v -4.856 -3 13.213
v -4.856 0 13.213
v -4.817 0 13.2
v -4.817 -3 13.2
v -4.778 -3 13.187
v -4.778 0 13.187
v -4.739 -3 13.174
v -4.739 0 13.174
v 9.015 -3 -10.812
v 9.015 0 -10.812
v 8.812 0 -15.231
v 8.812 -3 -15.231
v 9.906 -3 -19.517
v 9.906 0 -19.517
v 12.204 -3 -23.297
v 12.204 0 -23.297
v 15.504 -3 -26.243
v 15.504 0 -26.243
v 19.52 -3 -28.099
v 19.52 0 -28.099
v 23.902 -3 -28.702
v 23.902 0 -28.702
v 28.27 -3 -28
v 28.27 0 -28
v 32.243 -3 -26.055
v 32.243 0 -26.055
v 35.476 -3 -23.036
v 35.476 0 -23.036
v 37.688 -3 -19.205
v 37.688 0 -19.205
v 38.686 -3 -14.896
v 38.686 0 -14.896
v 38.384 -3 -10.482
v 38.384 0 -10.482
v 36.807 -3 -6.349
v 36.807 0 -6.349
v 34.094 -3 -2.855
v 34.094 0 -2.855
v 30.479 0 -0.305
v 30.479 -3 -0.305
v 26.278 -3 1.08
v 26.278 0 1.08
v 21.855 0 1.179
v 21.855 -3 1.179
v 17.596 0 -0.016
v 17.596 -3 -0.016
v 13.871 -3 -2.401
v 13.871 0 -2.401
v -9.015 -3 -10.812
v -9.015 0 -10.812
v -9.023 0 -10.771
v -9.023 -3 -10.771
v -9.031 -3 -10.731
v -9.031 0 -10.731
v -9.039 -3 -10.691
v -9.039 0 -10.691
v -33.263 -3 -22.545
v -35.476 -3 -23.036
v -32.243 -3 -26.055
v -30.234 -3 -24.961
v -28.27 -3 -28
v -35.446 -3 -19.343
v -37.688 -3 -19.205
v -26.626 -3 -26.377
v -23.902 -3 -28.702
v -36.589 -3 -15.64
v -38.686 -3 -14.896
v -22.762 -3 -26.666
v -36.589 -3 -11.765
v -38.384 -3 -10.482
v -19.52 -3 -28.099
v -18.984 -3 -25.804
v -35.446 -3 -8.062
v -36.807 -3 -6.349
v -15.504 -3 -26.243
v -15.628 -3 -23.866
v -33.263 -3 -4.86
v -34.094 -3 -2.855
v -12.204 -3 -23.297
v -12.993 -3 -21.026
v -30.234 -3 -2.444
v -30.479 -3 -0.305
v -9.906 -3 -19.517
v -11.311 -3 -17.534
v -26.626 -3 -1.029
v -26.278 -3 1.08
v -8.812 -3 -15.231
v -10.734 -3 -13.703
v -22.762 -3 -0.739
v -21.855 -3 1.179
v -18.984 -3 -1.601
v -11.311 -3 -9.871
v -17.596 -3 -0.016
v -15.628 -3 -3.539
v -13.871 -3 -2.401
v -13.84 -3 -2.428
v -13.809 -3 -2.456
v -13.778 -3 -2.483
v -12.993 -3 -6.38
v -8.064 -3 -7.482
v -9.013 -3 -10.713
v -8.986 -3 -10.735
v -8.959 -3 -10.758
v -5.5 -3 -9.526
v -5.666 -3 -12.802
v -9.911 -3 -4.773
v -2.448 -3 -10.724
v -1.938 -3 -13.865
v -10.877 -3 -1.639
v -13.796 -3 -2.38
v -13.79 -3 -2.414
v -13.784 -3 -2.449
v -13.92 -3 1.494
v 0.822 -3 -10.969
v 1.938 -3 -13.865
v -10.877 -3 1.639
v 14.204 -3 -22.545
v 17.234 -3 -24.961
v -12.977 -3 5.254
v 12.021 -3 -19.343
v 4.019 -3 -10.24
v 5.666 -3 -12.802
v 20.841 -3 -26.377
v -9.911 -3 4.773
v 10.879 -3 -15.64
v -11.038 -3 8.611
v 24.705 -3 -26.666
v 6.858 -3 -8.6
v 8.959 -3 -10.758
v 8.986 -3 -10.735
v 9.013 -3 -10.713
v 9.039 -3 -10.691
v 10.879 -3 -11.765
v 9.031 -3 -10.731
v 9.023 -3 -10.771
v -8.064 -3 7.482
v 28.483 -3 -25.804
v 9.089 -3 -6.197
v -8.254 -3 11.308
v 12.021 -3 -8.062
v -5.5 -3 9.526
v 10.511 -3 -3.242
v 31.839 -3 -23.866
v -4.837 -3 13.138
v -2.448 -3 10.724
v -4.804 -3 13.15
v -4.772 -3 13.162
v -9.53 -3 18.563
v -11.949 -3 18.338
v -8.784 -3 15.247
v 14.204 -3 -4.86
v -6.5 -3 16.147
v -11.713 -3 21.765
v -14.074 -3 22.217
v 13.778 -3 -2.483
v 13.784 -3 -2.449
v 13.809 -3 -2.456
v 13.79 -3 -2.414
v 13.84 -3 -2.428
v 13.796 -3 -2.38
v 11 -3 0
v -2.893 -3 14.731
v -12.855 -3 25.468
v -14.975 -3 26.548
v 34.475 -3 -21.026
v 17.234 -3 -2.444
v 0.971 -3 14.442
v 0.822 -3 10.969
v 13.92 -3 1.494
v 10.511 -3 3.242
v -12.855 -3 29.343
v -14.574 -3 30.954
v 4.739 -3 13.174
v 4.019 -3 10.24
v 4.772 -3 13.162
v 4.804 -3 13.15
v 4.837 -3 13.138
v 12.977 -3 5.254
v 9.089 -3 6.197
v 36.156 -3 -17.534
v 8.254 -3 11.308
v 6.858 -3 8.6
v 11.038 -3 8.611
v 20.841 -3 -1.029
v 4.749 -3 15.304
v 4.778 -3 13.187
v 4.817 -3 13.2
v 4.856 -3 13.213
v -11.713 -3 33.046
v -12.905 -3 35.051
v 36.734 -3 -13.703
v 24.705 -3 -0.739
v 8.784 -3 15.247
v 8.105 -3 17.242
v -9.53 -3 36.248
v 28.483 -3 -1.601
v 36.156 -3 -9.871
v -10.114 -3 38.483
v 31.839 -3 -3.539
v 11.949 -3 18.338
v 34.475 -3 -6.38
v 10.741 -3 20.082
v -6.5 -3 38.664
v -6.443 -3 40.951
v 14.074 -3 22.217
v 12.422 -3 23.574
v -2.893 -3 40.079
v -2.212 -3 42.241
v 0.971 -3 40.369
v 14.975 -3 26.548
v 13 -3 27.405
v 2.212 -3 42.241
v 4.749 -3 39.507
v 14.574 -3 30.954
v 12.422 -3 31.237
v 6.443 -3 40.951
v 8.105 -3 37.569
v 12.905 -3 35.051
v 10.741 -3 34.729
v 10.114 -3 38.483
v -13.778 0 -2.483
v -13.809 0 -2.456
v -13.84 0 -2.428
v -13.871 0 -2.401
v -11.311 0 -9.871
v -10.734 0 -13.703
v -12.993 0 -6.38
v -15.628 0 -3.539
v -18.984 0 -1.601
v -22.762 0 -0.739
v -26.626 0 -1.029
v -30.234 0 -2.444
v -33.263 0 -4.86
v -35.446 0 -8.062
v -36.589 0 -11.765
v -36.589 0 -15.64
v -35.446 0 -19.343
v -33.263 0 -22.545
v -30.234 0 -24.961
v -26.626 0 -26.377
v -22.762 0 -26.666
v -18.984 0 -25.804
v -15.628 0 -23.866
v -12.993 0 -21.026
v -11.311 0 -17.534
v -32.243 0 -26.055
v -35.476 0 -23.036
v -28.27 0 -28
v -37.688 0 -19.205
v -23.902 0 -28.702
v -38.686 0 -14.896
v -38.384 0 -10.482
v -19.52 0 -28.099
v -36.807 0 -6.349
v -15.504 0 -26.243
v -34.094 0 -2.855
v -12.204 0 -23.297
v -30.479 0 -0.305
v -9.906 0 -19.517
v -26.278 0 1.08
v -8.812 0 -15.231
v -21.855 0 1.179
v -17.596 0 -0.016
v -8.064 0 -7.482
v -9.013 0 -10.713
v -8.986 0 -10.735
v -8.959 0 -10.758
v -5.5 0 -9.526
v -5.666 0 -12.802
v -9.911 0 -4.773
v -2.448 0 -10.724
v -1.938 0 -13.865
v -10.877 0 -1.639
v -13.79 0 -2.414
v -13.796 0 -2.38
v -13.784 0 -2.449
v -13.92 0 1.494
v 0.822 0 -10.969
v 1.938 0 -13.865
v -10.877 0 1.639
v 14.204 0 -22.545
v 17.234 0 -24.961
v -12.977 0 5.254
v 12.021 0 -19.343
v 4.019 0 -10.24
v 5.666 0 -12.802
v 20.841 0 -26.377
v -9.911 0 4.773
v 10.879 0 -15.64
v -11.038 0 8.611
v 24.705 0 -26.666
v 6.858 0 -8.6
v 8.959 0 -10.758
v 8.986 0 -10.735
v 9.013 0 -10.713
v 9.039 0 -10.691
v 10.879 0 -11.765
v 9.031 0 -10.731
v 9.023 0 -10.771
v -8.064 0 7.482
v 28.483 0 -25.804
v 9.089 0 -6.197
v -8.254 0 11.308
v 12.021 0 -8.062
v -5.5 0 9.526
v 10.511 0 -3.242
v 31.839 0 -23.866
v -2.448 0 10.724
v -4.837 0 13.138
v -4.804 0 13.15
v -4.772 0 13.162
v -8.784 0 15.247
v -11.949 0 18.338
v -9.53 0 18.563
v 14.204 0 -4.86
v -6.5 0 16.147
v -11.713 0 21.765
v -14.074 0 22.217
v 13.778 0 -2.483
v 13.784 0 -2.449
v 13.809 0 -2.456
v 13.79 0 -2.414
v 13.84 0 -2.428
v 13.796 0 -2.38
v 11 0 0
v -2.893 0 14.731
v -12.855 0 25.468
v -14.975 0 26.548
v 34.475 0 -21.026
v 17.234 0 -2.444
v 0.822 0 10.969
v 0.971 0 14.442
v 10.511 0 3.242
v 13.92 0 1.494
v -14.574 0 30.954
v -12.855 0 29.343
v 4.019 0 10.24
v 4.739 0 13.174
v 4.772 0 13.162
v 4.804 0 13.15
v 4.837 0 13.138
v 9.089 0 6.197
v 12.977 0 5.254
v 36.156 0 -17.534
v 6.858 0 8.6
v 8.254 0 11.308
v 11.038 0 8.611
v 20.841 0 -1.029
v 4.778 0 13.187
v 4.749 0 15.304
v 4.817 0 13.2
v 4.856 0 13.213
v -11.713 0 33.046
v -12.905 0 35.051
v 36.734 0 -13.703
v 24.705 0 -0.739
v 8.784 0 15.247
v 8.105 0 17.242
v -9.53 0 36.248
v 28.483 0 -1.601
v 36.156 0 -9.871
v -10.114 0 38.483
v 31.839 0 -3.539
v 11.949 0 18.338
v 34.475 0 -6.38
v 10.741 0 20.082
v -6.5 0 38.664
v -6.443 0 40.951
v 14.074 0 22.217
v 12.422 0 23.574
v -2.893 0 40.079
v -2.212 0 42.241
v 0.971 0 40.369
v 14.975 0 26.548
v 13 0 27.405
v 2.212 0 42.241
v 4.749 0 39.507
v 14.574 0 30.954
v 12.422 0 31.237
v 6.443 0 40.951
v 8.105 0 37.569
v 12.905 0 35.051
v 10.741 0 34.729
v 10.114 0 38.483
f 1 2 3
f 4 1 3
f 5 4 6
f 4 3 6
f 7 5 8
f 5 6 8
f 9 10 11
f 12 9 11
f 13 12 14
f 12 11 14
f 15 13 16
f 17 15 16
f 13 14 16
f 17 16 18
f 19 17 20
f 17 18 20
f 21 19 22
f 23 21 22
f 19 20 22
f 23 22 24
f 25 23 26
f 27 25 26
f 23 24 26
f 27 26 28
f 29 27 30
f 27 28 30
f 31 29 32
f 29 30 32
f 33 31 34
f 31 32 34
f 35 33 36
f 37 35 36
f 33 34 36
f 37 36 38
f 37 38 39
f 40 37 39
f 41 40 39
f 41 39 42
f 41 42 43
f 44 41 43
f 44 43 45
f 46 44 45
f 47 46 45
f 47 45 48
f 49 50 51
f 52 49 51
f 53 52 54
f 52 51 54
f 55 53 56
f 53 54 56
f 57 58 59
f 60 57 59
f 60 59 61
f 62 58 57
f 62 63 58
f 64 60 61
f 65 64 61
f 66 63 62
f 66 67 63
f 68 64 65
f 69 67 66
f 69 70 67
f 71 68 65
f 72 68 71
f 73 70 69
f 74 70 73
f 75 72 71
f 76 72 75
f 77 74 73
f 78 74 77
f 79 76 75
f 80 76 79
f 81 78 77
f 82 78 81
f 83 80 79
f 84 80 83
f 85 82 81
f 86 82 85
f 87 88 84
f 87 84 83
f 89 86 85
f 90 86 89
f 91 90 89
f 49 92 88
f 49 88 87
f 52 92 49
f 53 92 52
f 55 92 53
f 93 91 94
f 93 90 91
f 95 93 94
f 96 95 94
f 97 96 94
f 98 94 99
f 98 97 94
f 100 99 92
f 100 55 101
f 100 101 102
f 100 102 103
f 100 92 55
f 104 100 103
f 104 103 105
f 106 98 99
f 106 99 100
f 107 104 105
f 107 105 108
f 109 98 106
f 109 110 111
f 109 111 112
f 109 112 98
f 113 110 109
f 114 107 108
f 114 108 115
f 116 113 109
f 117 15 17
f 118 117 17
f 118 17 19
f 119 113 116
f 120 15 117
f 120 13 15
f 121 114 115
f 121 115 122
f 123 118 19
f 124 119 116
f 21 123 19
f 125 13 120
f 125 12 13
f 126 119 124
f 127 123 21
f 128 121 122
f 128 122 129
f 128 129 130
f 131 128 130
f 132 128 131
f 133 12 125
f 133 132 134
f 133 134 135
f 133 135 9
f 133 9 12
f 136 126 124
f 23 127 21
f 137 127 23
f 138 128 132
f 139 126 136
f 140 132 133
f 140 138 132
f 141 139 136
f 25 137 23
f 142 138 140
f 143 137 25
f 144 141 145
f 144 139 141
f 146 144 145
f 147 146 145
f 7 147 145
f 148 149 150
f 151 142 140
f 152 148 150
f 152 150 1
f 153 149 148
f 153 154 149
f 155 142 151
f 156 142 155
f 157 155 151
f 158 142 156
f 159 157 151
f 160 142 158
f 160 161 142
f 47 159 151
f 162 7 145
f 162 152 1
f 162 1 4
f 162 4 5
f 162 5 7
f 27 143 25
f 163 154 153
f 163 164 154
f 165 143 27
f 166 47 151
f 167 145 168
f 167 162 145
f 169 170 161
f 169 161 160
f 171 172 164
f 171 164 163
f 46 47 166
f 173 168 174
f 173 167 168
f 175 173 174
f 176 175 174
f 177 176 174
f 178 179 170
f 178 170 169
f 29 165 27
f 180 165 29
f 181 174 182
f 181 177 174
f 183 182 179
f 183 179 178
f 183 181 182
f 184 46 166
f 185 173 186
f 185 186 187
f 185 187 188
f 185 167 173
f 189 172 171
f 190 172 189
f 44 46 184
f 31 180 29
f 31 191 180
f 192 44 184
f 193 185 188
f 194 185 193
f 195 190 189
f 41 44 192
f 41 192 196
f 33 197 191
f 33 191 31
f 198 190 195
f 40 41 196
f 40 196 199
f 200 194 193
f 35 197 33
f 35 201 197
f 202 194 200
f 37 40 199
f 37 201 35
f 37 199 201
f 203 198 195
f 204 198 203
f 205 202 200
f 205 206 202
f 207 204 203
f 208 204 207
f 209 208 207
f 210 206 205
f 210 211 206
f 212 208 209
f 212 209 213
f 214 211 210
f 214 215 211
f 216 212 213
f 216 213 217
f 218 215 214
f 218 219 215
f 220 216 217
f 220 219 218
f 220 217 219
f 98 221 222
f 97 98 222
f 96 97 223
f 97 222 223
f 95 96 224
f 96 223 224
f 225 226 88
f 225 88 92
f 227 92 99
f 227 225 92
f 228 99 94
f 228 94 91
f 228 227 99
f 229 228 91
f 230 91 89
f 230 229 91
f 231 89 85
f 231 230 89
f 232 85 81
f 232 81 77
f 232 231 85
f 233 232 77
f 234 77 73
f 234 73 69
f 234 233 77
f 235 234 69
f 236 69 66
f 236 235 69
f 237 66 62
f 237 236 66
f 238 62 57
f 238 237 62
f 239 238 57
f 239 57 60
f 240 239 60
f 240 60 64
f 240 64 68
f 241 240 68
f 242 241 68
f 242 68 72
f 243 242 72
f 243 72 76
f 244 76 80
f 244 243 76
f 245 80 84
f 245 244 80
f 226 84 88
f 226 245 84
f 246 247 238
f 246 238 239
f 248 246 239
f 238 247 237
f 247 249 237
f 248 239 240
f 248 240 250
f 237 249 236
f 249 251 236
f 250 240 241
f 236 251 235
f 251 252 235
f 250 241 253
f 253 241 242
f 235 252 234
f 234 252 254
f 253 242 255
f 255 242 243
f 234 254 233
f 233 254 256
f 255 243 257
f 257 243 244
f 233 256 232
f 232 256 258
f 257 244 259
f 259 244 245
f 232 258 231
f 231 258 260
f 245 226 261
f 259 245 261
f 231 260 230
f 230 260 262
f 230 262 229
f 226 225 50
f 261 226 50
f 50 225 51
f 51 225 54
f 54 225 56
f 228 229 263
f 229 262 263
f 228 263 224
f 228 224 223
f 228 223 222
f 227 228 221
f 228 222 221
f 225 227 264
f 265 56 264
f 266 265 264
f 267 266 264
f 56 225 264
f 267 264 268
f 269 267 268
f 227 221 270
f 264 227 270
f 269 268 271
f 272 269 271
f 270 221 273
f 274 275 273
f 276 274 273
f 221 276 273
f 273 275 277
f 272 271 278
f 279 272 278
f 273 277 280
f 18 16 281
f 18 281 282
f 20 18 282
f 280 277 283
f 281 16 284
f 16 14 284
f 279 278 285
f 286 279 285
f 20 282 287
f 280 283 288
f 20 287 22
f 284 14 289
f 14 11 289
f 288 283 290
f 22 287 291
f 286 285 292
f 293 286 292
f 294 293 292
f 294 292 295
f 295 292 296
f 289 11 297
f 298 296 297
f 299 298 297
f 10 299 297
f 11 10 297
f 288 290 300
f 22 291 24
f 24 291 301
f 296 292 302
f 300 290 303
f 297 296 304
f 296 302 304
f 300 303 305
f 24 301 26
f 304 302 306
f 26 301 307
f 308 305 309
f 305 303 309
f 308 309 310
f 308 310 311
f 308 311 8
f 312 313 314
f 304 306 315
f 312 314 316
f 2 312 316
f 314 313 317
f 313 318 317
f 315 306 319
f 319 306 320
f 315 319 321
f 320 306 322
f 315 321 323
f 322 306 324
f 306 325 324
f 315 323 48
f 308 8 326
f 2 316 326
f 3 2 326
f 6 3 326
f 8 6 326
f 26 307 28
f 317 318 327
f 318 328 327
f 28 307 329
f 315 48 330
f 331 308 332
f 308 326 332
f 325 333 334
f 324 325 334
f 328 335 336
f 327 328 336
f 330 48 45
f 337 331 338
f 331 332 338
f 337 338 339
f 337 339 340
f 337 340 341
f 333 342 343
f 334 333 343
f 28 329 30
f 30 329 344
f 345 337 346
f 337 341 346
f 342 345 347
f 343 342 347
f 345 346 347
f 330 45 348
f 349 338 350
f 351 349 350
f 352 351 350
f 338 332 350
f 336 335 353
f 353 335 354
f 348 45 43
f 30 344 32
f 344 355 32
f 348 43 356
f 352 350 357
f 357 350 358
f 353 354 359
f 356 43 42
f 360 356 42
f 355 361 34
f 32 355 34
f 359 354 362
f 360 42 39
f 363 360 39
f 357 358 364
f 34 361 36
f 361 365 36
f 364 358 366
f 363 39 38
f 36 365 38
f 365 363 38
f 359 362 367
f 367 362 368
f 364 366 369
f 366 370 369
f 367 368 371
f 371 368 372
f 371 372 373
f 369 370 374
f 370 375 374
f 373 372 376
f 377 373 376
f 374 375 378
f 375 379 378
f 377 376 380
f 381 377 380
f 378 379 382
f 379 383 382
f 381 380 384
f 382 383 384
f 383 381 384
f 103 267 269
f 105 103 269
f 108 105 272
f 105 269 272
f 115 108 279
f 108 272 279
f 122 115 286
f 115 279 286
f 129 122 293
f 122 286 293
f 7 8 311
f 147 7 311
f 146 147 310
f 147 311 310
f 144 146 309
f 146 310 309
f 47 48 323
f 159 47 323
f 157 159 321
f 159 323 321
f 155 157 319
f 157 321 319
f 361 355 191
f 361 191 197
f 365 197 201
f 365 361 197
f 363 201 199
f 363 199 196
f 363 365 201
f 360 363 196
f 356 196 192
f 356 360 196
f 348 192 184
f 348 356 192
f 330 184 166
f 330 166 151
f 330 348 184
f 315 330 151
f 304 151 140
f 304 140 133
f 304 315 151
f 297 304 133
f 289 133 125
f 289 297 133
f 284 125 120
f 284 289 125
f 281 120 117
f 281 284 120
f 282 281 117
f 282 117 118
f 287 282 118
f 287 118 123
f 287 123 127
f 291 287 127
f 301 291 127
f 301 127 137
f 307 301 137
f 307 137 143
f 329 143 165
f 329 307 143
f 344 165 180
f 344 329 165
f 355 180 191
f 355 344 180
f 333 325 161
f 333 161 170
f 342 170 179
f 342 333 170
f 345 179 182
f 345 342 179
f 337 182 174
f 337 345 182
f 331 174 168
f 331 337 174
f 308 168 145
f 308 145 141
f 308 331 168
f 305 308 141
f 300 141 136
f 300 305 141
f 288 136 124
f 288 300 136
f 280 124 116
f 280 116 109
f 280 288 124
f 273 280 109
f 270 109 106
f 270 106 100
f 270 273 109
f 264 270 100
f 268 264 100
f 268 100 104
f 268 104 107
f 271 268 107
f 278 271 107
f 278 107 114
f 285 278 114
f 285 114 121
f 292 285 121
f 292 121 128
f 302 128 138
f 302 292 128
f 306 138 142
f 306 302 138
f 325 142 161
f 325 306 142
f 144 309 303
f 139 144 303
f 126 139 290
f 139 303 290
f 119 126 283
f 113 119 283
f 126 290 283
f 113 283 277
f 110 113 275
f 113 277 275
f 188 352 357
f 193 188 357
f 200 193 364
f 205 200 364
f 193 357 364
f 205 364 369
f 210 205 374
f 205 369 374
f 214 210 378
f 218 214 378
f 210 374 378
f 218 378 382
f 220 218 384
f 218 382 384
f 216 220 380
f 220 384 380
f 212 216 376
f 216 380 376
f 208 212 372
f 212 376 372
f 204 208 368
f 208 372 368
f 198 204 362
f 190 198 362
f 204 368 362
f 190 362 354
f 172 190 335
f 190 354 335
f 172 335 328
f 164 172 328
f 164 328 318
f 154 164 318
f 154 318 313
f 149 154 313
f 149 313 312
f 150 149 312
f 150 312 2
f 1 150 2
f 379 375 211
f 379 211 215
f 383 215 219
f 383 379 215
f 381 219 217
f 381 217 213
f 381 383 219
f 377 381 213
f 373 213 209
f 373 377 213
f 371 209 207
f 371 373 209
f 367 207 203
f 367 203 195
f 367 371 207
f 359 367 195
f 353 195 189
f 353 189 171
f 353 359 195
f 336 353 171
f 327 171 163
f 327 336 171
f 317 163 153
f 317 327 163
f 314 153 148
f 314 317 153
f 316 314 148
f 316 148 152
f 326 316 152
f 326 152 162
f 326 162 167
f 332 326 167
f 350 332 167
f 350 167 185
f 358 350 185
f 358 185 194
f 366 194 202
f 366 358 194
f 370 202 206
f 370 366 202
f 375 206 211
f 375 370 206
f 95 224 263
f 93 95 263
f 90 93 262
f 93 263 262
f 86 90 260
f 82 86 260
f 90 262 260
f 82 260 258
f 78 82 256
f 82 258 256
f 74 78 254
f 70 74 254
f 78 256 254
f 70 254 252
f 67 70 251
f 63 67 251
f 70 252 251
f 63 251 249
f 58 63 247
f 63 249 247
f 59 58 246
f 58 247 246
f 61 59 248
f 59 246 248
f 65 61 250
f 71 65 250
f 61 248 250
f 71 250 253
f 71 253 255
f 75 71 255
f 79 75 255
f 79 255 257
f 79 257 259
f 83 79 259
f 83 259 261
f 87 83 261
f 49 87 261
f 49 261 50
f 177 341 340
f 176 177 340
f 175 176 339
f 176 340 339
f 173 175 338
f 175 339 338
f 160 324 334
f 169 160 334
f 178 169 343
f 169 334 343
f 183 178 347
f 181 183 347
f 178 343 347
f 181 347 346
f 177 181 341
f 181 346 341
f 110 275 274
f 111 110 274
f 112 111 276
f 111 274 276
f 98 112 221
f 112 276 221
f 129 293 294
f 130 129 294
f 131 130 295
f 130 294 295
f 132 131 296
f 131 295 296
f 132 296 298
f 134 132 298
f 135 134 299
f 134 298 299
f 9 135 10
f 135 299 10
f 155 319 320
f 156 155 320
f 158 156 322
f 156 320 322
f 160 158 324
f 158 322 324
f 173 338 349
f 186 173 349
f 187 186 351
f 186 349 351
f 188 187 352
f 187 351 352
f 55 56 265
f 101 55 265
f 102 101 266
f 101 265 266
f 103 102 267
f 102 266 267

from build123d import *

# Parameters (mm, degrees)
F0_R     = 13
F0_R_2   = 11
F1_DEPTH = 3


with BuildPart() as f1:
    # F0 (on Front) → F1 (new body)
    with BuildSketch(Plane.XZ):
        with BuildLine():
            ThreePointArc((4.85576, 13.213033), (0, 42.40534), (-4.85576, 13.213033))
            ThreePointArc((-4.85576, 13.213033), (-4.797356, 13.193184), (-4.73887, 13.173576))
            ThreePointArc((-4.73887, 13.173576), (-4.787824, 13.155864), (-4.836711, 13.137969))
            ThreePointArc((-4.836711, 13.137969), (-12.124356, 7), (-13.79617, -2.38027))
            ThreePointArc((-13.79617, -2.38027), (-13.787224, -2.431555), (-13.778087, -2.482806))
            ThreePointArc((-13.778087, -2.482806), (-13.82431, -2.44196), (-13.870702, -2.401305))
            ThreePointArc((-13.870702, -2.401305), (-36.724102, -21.20267), (-9.014942, -10.811728))
            ThreePointArc((-9.014942, -10.811728), (-9.026955, -10.751224), (-9.039216, -10.69077))
            ThreePointArc((-9.039216, -10.69077), (-8.9994, -10.724309), (-8.95946, -10.757699))
            ThreePointArc((-8.95946, -10.757699), (0, -14), (8.95946, -10.757699))
            ThreePointArc((8.95946, -10.757699), (8.9994, -10.724309), (9.039216, -10.69077))
            ThreePointArc((9.039216, -10.69077), (9.026955, -10.751224), (9.014942, -10.811728))
            ThreePointArc((9.014942, -10.811728), (36.724102, -21.20267), (13.870702, -2.401305))
            ThreePointArc((13.870702, -2.401305), (13.82431, -2.44196), (13.778087, -2.482806))
            ThreePointArc((13.778087, -2.482806), (13.787224, -2.431555), (13.79617, -2.38027))
            ThreePointArc((13.79617, -2.38027), (12.124356, 7), (4.836711, 13.137969))
            ThreePointArc((4.836711, 13.137969), (4.787824, 13.155864), (4.73887, 13.173576))
            ThreePointArc((4.73887, 13.173576), (4.797356, 13.193184), (4.85576, 13.213033))
        make_face()
        with Locations((-23.733721, -13.70267)):
            Circle(F0_R, mode=Mode.SUBTRACT)
        with Locations((23.733721, -13.70267)):
            Circle(F0_R, mode=Mode.SUBTRACT)
        Circle(F0_R_2, mode=Mode.SUBTRACT)
        with Locations((0, 27.40534)):
            Circle(F0_R, mode=Mode.SUBTRACT)
    extrude(amount=F1_DEPTH)


solid = f1.part
